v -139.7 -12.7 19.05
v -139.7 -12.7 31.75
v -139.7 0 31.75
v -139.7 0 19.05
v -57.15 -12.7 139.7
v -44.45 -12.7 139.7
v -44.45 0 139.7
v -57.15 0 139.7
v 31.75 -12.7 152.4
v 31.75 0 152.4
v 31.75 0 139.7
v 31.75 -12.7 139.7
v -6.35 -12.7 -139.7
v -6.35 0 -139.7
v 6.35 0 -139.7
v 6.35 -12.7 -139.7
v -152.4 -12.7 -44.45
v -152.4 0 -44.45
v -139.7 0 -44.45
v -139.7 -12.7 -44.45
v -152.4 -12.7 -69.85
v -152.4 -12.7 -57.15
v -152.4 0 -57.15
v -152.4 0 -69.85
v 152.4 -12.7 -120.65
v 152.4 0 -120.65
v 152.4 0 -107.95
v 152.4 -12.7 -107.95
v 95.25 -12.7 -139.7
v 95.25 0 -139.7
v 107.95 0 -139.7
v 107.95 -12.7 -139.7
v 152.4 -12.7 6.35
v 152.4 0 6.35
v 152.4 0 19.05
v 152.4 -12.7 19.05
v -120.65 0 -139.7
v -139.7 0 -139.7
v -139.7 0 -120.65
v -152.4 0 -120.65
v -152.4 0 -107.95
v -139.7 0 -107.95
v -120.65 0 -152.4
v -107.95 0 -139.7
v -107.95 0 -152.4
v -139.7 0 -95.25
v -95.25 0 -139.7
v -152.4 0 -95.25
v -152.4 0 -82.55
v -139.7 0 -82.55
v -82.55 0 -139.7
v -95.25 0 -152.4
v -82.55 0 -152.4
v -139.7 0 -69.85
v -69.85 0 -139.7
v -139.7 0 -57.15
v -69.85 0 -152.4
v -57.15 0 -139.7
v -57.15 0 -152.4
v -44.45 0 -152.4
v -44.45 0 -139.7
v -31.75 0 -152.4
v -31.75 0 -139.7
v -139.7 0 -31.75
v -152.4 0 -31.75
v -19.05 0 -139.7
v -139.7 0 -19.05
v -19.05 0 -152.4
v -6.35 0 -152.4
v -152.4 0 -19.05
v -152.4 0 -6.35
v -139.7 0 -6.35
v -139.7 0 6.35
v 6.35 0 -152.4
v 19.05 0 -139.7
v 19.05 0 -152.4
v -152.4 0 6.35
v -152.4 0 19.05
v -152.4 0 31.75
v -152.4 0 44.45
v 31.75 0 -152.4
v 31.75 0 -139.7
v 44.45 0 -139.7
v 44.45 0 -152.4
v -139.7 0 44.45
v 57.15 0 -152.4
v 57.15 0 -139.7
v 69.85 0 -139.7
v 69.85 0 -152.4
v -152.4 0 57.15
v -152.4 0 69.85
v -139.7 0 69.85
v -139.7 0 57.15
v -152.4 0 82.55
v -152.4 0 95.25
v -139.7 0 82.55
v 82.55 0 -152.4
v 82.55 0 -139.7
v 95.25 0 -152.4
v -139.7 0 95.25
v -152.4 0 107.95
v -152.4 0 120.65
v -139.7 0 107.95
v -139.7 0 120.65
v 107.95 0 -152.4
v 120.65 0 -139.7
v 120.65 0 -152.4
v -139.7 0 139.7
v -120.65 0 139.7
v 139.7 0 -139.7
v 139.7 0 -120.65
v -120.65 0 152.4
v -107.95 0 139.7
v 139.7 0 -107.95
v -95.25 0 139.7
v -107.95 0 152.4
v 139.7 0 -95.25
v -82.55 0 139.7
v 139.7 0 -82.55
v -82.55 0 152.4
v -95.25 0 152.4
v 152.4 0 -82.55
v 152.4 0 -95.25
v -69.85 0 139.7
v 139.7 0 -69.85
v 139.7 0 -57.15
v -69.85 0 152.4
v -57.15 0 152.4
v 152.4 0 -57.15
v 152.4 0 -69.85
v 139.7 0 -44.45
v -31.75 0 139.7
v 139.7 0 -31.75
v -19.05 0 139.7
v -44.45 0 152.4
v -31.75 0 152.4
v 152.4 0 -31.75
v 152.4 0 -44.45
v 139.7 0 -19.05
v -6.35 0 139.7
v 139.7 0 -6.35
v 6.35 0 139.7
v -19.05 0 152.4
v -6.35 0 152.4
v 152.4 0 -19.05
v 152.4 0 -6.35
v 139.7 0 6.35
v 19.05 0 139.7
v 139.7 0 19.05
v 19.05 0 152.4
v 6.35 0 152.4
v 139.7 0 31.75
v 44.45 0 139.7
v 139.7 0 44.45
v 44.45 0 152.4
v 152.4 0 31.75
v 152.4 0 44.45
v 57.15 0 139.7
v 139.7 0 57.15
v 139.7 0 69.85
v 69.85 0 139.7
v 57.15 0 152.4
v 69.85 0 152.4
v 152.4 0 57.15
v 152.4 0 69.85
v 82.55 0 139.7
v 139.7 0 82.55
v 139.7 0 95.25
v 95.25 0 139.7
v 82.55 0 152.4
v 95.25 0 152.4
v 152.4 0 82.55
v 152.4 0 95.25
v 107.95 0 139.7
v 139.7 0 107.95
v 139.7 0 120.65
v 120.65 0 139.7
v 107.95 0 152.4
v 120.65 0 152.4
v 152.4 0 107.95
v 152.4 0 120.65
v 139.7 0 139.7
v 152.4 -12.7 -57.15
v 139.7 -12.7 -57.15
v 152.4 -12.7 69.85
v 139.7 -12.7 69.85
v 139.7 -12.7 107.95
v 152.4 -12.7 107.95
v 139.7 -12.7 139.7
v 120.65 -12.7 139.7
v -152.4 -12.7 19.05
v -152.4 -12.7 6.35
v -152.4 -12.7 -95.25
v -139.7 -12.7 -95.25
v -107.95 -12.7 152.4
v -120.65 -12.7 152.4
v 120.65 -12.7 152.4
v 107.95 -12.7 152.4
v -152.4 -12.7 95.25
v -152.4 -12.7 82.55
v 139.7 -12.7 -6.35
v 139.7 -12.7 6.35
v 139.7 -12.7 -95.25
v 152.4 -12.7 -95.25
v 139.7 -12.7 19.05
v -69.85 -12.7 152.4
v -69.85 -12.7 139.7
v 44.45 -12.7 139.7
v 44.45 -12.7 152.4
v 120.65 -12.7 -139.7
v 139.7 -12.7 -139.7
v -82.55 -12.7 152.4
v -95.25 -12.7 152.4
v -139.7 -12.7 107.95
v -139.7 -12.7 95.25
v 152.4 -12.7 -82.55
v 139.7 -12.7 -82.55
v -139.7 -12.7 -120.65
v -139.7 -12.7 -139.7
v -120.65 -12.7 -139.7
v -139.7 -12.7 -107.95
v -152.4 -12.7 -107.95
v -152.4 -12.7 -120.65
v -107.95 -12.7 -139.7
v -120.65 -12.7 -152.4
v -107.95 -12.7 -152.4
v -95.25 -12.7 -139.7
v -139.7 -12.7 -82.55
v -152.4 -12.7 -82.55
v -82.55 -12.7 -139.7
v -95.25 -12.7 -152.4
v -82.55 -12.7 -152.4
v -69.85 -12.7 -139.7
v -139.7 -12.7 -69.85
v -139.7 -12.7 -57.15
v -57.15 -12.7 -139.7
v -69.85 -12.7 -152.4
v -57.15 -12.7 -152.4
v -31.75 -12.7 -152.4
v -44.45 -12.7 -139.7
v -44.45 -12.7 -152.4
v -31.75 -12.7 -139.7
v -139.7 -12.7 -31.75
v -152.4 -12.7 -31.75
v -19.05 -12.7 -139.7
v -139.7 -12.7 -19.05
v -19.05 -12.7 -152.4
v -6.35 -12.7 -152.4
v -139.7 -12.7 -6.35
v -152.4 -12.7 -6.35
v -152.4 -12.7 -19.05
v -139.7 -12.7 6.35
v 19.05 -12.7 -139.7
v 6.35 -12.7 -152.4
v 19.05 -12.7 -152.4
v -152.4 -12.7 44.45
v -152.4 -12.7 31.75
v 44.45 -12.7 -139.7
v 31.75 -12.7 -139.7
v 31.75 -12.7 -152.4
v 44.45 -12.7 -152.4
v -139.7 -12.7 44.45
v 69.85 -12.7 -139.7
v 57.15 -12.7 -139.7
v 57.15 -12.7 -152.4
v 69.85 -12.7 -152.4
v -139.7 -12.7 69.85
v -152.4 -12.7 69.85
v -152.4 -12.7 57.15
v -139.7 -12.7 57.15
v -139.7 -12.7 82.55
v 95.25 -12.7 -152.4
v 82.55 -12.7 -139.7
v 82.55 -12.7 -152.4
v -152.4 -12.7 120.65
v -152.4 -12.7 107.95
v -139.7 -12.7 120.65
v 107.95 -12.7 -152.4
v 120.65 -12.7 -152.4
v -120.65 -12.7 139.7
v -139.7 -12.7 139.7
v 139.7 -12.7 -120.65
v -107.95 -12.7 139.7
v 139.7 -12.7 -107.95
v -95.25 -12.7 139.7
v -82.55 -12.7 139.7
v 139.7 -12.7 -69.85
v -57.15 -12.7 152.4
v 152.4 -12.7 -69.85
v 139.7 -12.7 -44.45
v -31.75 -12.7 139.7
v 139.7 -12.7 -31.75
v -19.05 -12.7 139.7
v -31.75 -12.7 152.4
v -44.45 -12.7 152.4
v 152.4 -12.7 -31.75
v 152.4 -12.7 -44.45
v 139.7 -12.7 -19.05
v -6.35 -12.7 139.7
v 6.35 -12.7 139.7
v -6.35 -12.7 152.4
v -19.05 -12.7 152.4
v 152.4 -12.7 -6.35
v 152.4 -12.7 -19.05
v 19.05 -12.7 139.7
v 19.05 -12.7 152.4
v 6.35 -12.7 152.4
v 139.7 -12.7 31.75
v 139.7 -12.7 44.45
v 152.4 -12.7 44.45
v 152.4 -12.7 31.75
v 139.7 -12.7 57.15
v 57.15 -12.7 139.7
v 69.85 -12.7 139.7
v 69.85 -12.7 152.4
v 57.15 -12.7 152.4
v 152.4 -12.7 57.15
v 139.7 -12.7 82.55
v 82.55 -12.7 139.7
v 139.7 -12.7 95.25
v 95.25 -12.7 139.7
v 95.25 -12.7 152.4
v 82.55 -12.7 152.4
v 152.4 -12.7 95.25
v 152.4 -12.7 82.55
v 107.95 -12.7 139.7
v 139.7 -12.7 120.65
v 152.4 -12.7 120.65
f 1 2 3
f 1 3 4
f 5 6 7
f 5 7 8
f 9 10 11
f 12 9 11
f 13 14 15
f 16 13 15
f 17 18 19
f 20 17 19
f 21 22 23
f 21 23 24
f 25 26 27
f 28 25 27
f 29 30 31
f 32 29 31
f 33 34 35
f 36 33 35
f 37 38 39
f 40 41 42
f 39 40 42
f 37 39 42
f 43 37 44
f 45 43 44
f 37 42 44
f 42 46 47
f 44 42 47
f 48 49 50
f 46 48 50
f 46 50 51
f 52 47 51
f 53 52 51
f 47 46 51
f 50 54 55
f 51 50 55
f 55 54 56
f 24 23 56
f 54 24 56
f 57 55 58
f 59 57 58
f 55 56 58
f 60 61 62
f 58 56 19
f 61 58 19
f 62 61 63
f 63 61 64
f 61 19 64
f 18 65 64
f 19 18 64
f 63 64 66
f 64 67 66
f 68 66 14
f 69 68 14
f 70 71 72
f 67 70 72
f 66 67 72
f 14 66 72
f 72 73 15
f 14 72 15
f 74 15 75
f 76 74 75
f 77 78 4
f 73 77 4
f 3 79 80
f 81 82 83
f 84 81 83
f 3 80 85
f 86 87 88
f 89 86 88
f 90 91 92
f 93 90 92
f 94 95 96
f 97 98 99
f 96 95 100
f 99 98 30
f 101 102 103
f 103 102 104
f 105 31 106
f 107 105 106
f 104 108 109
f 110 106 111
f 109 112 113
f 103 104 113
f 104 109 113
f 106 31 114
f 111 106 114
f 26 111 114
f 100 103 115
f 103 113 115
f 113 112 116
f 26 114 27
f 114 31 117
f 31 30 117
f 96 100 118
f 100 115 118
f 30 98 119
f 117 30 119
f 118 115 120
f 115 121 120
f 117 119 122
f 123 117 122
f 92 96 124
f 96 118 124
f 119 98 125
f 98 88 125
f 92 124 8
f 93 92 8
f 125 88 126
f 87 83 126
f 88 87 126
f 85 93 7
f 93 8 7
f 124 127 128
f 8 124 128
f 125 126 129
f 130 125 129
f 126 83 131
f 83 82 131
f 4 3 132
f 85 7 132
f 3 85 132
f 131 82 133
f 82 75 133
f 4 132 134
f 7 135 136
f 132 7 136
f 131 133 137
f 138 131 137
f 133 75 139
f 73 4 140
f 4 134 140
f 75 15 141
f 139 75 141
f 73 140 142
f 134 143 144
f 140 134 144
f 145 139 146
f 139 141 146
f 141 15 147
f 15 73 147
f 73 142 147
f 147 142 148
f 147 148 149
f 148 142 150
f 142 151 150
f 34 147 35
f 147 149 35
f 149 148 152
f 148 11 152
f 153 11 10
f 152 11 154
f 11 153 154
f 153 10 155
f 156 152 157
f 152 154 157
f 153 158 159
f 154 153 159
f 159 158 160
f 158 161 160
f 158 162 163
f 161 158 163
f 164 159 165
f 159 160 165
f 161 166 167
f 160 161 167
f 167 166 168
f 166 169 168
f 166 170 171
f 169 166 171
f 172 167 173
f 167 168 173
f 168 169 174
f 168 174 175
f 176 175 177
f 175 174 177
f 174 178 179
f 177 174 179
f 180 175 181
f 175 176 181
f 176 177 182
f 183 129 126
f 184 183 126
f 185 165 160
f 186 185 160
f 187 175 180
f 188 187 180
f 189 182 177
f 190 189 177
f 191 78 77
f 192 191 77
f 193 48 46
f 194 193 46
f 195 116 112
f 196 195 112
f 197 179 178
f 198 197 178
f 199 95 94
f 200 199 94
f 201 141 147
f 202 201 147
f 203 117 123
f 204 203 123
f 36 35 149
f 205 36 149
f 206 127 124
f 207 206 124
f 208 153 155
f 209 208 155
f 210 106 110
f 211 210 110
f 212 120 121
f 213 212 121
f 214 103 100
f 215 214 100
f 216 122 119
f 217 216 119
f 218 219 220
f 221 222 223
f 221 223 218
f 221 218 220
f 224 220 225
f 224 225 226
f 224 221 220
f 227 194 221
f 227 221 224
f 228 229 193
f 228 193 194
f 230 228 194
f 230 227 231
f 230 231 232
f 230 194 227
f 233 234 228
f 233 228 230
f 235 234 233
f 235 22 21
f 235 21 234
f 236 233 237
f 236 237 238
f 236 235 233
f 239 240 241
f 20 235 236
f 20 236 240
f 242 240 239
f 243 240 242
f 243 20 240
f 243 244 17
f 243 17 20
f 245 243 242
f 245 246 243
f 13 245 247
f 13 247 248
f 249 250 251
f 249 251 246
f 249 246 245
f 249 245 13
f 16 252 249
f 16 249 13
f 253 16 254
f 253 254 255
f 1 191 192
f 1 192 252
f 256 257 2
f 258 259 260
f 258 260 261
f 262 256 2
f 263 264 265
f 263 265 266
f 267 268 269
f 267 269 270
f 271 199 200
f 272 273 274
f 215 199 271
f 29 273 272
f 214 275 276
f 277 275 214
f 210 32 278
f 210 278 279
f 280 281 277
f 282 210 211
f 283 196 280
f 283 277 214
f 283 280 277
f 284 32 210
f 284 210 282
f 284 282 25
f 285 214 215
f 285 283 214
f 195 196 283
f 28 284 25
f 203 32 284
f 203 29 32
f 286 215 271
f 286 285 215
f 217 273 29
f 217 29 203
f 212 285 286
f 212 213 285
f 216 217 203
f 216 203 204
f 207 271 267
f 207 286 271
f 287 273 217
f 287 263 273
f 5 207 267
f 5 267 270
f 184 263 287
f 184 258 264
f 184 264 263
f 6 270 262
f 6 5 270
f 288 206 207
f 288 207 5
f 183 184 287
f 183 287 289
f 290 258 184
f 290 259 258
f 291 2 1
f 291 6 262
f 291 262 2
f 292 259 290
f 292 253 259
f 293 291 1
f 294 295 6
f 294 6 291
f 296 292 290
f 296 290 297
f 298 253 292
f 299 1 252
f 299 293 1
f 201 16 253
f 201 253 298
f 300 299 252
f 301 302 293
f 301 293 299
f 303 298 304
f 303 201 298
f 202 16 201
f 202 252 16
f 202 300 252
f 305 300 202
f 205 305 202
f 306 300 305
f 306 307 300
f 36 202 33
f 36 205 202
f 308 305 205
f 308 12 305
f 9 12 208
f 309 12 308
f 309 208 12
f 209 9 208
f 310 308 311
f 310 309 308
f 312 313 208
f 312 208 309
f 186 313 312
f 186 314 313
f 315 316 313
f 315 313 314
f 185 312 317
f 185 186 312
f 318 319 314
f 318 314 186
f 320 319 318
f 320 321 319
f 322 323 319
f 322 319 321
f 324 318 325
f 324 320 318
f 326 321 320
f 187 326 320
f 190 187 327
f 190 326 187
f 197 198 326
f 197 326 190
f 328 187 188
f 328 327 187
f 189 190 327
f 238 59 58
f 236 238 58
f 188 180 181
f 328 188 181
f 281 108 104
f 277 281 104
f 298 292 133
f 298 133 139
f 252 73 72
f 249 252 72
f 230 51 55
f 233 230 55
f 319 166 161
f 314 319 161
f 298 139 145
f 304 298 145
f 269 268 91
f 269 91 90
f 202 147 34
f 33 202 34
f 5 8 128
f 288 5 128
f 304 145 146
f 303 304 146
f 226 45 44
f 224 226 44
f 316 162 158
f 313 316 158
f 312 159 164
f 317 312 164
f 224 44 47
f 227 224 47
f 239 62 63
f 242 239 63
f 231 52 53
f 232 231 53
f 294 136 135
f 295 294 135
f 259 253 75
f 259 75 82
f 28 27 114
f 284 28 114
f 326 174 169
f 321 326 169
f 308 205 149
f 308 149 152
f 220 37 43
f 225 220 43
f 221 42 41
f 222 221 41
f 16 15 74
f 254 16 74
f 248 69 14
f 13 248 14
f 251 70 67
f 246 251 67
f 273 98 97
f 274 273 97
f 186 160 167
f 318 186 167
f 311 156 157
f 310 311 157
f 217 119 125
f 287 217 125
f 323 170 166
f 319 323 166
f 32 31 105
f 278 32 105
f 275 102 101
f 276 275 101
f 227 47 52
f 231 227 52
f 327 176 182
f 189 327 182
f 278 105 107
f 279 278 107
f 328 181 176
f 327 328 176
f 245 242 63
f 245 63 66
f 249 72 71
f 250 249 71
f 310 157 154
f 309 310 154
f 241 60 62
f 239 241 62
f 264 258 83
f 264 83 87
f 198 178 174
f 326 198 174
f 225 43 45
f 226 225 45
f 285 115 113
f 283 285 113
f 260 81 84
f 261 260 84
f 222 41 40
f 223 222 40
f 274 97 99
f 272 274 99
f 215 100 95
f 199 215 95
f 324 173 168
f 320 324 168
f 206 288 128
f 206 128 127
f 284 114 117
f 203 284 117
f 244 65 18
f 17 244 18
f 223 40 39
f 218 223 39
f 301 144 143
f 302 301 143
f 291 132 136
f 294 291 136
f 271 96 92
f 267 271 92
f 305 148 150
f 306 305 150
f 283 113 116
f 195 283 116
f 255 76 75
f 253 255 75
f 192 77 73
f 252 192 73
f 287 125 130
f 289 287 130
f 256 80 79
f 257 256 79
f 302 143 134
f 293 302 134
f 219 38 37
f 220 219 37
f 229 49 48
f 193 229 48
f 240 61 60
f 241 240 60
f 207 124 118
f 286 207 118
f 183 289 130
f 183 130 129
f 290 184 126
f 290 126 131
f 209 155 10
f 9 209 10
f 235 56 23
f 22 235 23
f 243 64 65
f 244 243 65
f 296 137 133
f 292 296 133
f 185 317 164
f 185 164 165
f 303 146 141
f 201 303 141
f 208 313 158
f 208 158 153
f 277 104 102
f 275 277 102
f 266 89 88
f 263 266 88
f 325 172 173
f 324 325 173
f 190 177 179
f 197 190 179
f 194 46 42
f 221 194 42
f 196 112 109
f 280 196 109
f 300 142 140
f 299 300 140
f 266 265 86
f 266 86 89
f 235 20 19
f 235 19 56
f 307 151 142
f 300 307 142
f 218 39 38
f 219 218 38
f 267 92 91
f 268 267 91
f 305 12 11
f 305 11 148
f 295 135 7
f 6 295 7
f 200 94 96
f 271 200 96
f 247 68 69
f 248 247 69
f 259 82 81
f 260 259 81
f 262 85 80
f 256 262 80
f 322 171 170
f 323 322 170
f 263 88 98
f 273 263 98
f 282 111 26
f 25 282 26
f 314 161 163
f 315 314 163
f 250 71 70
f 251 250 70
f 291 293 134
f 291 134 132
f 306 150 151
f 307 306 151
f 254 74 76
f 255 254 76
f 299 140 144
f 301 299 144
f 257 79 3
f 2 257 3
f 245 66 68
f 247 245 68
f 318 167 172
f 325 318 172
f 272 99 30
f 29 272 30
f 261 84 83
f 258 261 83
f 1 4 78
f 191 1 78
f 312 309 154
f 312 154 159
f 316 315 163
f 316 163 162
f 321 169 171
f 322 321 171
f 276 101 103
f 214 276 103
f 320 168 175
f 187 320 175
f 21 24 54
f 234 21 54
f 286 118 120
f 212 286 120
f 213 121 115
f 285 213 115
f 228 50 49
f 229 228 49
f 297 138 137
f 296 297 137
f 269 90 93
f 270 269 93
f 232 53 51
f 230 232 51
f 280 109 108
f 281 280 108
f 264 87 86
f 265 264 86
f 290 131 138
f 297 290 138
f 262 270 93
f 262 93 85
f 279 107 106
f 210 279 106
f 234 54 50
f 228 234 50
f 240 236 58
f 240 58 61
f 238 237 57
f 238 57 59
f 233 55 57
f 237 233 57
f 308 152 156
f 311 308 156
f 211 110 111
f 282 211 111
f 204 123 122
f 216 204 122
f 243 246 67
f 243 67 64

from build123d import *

# Parameters (mm, degrees)
F1_DEPTH = 12.7


with BuildPart() as f1:
    # F0 (on Front) → F1 (new body)
    with BuildSketch(Plane.XZ):
        Polygon((-120.65, 152.4), (-120.65, 139.7), (-139.7, 139.7), (-139.7, 120.65), (-152.4, 120.65), (-152.4, 107.95), (-139.7, 107.95), (-139.7, 95.25), (-152.4, 95.25), (-152.4, 82.55), (-139.7, 82.55), (-139.7, 69.85), (-152.4, 69.85), (-152.4, 57.15), (-139.7, 57.15), (-139.7, 44.45), (-152.4, 44.45), (-152.4, 31.75), (-139.7, 31.75), (-139.7, 19.05), (-152.4, 19.05), (-152.4, 6.35), (-139.7, 6.35), (-139.7, -6.35), (-152.4, -6.35), (-152.4, -19.05), (-139.7, -19.05), (-139.7, -31.75), (-152.4, -31.75), (-152.4, -44.45), (-139.7, -44.45), (-139.7, -57.15), (-152.4, -57.15), (-152.4, -69.85), (-139.7, -69.85), (-139.7, -82.55), (-152.4, -82.55), (-152.4, -95.25), (-139.7, -95.25), (-139.7, -107.95), (-152.4, -107.95), (-152.4, -120.65), (-139.7, -120.65), (-139.7, -139.7), (-120.65, -139.7), (-120.65, -152.4), (-107.95, -152.4), (-107.95, -139.7), (-95.25, -139.7), (-95.25, -152.4), (-82.55, -152.4), (-82.55, -139.7), (-69.85, -139.7), (-69.85, -152.4), (-57.15, -152.4), (-57.15, -139.7), (-44.45, -139.7), (-44.45, -152.4), (-31.75, -152.4), (-31.75, -139.7), (-19.05, -139.7), (-19.05, -152.4), (-6.35, -152.4), (-6.35, -139.7), (6.35, -139.7), (6.35, -152.4), (19.05, -152.4), (19.05, -139.7), (31.75, -139.7), (31.75, -152.4), (44.45, -152.4), (44.45, -139.7), (57.15, -139.7), (57.15, -152.4), (69.85, -152.4), (69.85, -139.7), (82.55, -139.7), (82.55, -152.4), (95.25, -152.4), (95.25, -139.7), (107.95, -139.7), (107.95, -152.4), (120.65, -152.4), (120.65, -139.7), (139.7, -139.7), (139.7, -120.65), (152.4, -120.65), (152.4, -107.95), (139.7, -107.95), (139.7, -95.25), (152.4, -95.25), (152.4, -82.55), (139.7, -82.55), (139.7, -69.85), (152.4, -69.85), (152.4, -57.15), (139.7, -57.15), (139.7, -44.45), (152.4, -44.45), (152.4, -31.75), (139.7, -31.75), (139.7, -19.05), (152.4, -19.05), (152.4, -6.35), (139.7, -6.35), (139.7, 6.35), (152.4, 6.35), (152.4, 19.05), (139.7, 19.05), (139.7, 31.75), (152.4, 31.75), (152.4, 44.45), (139.7, 44.45), (139.7, 57.15), (152.4, 57.15), (152.4, 69.85), (139.7, 69.85), (139.7, 82.55), (152.4, 82.55), (152.4, 95.25), (139.7, 95.25), (139.7, 107.95), (152.4, 107.95), (152.4, 120.65), (139.7, 120.65), (139.7, 139.7), (120.65, 139.7), (120.65, 152.4), (107.95, 152.4), (107.95, 139.7), (95.25, 139.7), (95.25, 152.4), (82.55, 152.4), (82.55, 139.7), (69.85, 139.7), (69.85, 152.4), (57.15, 152.4), (57.15, 139.7), (44.45, 139.7), (44.45, 152.4), (31.75, 152.4), (31.75, 139.7), (19.05, 139.7), (19.05, 152.4), (6.35, 152.4), (6.35, 139.7), (-6.35, 139.7), (-6.35, 152.4), (-19.05, 152.4), (-19.05, 139.7), (-31.75, 139.7), (-31.75, 152.4), (-44.45, 152.4), (-44.45, 139.7), (-57.15, 139.7), (-57.15, 152.4), (-69.85, 152.4), (-69.85, 139.7), (-82.55, 139.7), (-82.55, 152.4), (-95.25, 152.4), (-95.25, 139.7), (-107.95, 139.7), (-107.95, 152.4), align=None)
    extrude(amount=F1_DEPTH)


solid = f1.part
